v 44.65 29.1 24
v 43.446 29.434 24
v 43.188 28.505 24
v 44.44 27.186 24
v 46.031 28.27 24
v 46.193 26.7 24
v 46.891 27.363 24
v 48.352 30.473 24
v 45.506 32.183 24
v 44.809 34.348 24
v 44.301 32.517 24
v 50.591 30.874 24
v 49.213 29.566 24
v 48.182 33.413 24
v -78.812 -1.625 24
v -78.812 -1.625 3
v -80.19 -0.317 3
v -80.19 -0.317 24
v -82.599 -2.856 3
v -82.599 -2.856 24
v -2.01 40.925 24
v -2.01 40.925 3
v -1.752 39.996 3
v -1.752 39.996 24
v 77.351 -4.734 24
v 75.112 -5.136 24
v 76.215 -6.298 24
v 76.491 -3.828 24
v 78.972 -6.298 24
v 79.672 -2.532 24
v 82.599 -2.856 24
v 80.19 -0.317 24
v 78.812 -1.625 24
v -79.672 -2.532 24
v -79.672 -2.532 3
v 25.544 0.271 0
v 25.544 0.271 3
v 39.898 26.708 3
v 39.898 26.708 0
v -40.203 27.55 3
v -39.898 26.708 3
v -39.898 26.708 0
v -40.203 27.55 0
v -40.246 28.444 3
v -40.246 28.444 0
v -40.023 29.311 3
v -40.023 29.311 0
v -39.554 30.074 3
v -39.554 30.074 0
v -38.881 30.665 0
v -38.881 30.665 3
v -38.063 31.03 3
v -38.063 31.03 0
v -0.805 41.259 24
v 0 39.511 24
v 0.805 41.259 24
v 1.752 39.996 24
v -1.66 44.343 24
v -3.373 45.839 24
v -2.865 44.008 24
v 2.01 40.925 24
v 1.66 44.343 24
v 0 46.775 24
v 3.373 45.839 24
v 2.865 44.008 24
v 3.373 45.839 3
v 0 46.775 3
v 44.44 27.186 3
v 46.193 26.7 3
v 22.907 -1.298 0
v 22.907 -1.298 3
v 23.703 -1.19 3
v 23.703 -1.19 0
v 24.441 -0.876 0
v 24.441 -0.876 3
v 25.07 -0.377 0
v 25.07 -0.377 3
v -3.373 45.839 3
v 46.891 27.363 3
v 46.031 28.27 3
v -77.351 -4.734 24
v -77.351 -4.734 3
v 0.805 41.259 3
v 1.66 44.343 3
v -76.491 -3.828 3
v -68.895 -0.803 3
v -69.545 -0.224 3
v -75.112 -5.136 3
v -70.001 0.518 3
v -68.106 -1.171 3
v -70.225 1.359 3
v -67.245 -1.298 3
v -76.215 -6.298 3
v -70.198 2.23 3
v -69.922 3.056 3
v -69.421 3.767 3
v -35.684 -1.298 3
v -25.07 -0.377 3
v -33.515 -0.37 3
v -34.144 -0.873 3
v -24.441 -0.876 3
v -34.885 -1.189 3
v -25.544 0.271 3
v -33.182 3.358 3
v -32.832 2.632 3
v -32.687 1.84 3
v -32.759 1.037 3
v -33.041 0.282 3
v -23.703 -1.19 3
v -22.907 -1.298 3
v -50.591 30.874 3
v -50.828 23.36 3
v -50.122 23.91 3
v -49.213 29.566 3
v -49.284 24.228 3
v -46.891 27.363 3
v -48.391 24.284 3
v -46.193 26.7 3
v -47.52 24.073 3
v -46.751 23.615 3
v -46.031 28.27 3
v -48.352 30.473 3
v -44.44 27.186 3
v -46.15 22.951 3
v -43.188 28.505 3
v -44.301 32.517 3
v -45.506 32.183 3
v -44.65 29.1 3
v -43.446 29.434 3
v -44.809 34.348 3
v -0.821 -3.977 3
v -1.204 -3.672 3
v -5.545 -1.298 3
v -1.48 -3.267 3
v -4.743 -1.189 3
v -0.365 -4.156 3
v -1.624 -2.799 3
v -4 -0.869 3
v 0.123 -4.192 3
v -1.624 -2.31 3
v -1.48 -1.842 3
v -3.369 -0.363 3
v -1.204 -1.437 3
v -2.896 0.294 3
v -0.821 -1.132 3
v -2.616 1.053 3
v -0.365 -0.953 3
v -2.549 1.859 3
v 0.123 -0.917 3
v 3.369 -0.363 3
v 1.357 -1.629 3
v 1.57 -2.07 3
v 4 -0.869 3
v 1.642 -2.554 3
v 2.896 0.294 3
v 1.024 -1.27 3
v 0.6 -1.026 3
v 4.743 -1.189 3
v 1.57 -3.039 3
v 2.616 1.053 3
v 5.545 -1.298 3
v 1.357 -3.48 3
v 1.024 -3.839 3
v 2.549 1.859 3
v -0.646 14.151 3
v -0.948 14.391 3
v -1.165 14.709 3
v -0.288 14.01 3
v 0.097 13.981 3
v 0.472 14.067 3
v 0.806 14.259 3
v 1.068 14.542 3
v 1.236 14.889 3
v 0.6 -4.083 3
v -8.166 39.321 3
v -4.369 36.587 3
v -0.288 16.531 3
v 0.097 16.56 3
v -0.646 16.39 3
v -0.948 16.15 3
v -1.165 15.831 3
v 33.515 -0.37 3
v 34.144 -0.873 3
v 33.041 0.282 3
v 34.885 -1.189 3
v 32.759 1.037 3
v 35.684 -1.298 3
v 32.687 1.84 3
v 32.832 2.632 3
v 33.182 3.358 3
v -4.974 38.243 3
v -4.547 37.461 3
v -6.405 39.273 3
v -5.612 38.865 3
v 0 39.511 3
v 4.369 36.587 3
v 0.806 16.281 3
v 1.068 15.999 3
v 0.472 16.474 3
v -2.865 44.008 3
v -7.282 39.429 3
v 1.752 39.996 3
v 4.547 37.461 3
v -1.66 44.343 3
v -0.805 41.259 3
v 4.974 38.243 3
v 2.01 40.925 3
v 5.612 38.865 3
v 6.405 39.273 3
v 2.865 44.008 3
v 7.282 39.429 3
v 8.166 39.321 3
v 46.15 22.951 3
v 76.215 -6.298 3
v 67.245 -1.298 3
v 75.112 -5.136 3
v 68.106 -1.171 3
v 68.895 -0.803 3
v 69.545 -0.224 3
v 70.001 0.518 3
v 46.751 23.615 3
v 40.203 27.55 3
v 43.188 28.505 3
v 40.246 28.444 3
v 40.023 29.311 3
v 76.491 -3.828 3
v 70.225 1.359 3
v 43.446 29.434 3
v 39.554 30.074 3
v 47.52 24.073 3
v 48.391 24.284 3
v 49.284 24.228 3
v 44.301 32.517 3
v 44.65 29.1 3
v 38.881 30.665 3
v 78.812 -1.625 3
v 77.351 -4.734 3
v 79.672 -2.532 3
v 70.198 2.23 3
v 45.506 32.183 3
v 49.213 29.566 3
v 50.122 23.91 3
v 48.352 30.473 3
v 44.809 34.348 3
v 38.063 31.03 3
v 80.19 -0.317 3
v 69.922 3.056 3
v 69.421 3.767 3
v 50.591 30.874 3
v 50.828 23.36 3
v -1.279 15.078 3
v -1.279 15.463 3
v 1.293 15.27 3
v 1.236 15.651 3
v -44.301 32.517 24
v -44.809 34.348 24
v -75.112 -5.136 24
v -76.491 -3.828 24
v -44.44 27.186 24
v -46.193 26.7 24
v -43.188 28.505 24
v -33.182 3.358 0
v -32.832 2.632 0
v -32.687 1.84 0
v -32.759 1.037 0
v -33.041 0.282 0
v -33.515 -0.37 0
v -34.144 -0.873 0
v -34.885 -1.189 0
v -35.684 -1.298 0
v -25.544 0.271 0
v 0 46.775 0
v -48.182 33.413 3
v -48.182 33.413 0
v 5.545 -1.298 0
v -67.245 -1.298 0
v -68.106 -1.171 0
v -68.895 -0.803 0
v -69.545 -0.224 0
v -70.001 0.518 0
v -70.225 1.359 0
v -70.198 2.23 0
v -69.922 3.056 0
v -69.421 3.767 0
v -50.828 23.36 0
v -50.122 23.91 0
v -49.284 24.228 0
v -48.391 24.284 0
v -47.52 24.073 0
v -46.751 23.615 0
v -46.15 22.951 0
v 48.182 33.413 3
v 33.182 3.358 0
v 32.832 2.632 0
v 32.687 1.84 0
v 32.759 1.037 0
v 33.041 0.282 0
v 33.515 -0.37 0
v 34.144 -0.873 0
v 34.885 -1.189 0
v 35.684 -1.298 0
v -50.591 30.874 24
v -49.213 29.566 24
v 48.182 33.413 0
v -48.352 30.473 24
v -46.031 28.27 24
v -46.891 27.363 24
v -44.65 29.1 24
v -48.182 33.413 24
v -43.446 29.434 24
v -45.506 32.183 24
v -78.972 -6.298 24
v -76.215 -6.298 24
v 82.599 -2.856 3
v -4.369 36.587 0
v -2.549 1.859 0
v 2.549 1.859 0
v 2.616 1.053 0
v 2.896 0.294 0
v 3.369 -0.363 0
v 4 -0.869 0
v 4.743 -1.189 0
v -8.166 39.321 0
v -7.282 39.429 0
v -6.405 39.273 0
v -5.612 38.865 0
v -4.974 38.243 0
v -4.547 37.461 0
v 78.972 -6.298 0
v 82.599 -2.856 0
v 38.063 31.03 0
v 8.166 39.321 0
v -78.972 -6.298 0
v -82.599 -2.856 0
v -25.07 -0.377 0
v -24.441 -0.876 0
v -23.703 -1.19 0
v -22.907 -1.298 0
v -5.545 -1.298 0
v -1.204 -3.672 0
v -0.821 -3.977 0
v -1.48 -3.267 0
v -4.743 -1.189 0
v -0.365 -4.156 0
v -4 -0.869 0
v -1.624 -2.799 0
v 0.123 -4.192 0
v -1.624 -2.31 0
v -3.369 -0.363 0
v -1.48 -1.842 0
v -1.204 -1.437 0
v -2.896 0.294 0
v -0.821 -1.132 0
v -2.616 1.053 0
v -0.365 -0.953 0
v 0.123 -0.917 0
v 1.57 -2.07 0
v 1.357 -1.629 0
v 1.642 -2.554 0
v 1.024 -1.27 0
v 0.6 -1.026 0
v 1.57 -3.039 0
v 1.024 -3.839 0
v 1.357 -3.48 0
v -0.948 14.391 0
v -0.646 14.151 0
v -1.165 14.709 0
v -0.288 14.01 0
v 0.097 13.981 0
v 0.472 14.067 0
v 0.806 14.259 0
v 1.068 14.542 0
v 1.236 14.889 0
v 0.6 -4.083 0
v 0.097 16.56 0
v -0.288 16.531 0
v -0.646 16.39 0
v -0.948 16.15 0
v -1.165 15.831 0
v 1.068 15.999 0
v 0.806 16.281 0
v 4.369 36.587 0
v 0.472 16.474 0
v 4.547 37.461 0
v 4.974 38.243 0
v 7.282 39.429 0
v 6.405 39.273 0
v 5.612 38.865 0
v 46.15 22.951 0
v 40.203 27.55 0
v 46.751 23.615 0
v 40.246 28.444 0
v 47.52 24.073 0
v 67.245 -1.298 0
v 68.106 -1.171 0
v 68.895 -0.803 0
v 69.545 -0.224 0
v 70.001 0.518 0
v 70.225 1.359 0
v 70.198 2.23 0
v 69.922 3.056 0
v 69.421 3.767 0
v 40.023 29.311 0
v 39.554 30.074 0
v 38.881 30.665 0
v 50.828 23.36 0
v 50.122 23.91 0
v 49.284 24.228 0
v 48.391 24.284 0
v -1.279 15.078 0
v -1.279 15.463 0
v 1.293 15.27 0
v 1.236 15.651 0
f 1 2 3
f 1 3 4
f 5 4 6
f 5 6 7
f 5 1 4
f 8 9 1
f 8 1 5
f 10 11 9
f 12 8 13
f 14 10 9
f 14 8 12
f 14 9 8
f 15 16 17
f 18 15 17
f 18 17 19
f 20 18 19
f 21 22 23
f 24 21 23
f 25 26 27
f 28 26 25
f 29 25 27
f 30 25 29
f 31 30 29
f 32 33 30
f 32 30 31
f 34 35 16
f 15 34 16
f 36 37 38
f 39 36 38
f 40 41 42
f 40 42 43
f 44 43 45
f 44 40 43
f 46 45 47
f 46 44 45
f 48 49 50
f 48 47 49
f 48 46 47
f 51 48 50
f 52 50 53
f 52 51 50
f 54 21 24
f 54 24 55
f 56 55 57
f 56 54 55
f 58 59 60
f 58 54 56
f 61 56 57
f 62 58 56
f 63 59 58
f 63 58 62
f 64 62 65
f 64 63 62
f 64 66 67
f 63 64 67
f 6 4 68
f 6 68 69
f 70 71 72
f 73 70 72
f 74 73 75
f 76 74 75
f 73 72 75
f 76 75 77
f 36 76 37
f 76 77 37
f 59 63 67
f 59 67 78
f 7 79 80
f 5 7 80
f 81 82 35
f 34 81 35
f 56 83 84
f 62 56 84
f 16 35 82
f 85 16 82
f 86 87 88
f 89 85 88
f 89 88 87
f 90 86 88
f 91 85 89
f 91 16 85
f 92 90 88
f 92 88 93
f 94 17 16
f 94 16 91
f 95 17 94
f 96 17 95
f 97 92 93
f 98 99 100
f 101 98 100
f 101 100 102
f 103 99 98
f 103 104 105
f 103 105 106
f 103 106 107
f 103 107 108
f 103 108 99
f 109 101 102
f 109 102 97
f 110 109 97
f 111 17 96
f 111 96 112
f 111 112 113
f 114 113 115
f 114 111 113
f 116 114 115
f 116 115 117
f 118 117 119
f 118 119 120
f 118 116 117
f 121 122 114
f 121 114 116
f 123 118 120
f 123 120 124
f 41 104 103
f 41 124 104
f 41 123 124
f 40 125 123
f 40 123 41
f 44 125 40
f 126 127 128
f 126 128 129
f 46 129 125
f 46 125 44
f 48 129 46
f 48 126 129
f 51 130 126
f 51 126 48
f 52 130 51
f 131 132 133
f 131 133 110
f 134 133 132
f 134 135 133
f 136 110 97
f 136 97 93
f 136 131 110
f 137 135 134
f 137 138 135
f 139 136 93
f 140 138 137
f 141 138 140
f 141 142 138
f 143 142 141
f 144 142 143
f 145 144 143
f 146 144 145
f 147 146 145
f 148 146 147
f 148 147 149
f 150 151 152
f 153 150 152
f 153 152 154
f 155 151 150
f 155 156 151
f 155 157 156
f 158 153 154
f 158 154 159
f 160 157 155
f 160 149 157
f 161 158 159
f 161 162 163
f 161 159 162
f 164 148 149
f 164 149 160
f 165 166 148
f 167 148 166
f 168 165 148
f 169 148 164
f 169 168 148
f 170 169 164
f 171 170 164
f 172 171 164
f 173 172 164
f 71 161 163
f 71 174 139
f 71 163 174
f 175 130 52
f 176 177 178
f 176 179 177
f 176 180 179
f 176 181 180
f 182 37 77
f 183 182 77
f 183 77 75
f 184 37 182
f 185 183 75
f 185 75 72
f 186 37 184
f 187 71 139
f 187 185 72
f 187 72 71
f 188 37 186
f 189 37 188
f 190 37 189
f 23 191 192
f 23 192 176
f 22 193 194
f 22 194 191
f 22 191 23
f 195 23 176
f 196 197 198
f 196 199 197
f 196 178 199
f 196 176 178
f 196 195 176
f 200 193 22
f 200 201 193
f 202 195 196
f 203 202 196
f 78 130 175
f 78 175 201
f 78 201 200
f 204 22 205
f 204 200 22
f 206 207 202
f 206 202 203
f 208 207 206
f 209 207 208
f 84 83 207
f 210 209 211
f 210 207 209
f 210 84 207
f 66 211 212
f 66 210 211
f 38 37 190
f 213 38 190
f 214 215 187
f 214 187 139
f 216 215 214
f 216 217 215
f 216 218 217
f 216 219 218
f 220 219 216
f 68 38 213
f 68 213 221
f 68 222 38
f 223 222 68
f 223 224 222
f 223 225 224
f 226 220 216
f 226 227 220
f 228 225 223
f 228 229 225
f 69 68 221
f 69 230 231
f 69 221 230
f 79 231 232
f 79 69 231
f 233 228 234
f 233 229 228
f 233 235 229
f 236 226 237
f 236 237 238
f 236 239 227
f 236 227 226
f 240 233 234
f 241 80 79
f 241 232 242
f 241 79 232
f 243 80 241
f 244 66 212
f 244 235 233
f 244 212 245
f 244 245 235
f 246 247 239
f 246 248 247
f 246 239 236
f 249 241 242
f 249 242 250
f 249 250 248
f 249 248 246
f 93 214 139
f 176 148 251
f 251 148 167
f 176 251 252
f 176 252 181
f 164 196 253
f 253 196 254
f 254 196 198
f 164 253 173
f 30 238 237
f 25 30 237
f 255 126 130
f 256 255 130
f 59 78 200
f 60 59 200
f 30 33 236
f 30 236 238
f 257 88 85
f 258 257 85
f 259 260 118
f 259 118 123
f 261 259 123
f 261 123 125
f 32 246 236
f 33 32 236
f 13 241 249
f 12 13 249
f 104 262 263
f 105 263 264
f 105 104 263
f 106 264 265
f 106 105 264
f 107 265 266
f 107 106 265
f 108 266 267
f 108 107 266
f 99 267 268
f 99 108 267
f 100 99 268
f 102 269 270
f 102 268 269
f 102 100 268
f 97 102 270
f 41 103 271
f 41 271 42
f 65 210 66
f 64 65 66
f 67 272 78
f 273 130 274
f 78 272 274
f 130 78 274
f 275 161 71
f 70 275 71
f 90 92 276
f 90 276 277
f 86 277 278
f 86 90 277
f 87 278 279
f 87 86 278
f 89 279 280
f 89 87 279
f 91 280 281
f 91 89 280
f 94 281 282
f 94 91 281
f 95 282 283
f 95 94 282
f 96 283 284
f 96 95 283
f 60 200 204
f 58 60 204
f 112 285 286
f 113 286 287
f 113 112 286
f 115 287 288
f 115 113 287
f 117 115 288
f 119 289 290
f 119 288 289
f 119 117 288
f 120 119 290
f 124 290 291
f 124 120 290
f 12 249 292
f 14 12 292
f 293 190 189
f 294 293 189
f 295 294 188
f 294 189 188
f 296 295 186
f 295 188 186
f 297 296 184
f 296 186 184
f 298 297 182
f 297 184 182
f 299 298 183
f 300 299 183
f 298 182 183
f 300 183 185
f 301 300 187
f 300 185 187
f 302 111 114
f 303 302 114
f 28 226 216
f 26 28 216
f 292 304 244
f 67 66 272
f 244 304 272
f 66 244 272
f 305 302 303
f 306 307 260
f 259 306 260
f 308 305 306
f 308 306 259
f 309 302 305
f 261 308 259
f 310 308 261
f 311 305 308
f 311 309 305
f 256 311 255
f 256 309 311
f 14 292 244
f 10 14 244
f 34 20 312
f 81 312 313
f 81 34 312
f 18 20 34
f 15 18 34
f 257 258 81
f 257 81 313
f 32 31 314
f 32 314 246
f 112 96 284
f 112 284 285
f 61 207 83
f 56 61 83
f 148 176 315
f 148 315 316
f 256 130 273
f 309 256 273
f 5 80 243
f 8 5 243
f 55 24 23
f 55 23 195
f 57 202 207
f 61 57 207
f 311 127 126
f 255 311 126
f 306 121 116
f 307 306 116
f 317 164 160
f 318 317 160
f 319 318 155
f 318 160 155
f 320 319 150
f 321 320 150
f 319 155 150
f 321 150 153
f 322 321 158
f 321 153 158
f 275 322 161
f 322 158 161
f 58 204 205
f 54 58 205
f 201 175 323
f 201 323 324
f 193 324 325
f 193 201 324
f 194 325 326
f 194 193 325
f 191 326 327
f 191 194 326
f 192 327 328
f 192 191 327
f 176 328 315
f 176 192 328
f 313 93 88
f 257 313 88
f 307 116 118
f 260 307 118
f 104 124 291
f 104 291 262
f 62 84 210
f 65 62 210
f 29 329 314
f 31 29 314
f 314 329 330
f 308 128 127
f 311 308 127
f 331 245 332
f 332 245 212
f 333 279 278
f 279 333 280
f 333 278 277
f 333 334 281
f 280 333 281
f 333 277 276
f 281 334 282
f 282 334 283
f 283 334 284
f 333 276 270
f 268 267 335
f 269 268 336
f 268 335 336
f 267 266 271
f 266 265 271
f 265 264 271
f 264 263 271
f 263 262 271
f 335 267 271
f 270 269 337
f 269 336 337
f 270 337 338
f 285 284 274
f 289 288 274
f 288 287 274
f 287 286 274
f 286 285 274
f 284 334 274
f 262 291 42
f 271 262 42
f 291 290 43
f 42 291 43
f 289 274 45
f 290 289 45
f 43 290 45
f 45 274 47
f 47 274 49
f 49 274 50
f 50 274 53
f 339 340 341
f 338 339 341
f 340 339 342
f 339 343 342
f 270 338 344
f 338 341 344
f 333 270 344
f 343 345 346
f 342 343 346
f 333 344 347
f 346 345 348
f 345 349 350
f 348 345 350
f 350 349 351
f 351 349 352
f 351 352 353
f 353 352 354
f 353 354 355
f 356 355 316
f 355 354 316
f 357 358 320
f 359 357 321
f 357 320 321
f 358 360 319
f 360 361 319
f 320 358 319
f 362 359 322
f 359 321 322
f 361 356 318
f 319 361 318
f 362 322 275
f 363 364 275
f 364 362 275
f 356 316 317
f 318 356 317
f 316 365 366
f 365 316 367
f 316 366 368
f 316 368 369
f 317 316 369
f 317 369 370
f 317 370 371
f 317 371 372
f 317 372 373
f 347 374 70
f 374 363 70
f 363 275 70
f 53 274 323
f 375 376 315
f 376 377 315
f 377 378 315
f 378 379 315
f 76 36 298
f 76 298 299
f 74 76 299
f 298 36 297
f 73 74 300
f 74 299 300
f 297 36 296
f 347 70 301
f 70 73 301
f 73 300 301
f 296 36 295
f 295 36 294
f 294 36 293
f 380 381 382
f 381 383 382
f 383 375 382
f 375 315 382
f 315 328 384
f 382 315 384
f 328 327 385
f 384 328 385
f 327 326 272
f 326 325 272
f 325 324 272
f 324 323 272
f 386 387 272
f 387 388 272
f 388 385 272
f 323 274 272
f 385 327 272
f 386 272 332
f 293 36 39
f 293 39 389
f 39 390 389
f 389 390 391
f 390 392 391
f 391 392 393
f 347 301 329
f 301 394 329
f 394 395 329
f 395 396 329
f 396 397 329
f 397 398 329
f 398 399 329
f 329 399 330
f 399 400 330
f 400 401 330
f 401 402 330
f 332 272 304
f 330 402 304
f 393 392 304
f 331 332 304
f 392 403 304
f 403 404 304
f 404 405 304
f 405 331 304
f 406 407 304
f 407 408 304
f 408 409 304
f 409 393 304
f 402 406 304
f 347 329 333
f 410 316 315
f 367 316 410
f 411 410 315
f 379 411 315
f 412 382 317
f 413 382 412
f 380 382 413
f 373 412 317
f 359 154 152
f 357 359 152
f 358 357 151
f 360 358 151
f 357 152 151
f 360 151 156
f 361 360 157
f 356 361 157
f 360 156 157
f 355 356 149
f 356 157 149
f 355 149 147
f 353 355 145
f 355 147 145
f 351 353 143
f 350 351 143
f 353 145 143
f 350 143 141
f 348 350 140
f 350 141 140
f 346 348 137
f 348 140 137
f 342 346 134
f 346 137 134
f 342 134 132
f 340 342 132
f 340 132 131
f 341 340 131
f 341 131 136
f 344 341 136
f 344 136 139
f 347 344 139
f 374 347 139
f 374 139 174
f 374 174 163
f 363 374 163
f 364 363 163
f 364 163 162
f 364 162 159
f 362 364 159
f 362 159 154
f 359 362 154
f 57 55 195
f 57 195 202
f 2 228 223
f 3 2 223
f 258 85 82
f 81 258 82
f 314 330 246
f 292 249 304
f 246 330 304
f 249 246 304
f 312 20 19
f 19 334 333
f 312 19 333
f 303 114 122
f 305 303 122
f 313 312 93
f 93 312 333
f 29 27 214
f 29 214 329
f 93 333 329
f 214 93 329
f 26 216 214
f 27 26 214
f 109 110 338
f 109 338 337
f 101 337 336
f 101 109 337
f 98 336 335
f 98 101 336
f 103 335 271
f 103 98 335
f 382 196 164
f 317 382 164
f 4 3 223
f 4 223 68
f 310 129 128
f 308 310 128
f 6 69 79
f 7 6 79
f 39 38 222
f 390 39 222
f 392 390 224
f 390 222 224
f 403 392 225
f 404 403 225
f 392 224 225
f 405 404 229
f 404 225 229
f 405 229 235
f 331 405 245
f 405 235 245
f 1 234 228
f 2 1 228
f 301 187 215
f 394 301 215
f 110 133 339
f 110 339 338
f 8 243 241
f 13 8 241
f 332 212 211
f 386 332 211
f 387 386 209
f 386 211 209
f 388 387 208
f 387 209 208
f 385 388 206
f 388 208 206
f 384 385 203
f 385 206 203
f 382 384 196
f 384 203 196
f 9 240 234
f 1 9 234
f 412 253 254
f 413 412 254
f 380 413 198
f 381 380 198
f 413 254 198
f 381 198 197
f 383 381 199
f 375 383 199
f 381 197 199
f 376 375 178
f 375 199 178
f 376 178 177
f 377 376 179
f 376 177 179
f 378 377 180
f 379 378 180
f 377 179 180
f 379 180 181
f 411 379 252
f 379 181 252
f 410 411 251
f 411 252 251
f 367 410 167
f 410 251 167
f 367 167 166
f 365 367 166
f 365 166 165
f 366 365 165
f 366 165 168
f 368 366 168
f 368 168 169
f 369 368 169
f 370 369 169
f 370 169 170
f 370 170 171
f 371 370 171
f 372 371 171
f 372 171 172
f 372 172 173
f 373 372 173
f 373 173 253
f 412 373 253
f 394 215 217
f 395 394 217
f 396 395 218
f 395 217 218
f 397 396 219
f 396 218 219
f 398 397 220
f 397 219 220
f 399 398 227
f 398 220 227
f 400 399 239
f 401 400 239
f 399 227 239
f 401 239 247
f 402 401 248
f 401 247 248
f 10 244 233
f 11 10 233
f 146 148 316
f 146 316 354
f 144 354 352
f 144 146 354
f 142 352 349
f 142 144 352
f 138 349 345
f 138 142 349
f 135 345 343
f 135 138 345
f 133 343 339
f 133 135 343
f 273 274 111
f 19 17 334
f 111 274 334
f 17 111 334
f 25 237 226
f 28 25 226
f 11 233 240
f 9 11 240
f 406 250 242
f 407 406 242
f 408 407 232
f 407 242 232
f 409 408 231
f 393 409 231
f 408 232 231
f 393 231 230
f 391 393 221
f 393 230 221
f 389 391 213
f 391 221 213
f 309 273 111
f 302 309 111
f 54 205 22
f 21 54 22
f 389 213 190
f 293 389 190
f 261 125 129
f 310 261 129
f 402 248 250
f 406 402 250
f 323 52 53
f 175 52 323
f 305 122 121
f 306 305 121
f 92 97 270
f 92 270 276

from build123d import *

# Parameters (mm, degrees)
BOSS_EXTRUDE1_DEPTH = 3
BOSS_EXTRUDE2_DEPTH = 21
SKETCH3_R           = 1.642484664
SKETCH3_R_2         = 1.292978033
CUT_EXTRUDE1_DEPTH  = 98.218880344


with BuildPart() as part:
    # Sketch1 → Boss-Extrude1 (new body)
    with BuildSketch(Plane.XY):
        Polygon((-82.599251445, -2.855918156), (-78.97237959, -6.297691035), (78.97237959, -6.297691035), (82.599251445, -2.855918156), (48.18152266, 33.412800394), (0, 46.774719198), (-48.18152266, 33.412800394), align=None)
    extrude(amount=BOSS_EXTRUDE1_DEPTH)

    # Sketch2 → Boss-Extrude2 (add)
    with BuildSketch(Plane.XY.offset(3)):
        Polygon((-44.808816074, 34.34813471), (-48.18152266, 33.412800394), (-50.590763675, 30.873990096), (-49.21255237, 29.566116402), (-48.352109151, 30.472834366), (-46.030911164, 28.270099723), (-46.891354383, 27.36338176), (-46.192513036, 26.700206083), (-44.440185395, 27.186169547), (-43.188437129, 28.505236993), (-43.445900356, 29.433619399), (-44.650438423, 29.099571429), (-45.505601226, 32.183188879), (-44.30106316, 32.517236849), align=None)
        Polygon((0, 46.774719198), (-3.372706586, 45.839384882), (-2.864953672, 44.008487021), (-1.660415605, 44.342534991), (-0.805252802, 41.25891754), (-2.009790868, 40.92486957), (-1.752327641, 39.996487164), (0, 39.5105237), (1.752327641, 39.996487164), (2.009790868, 40.92486957), (0.805252802, 41.25891754), (1.660415605, 44.342534991), (2.864953672, 44.008487021), (3.372706586, 45.839384882), align=None)
        Polygon((-78.811799125, -1.624981552), (-80.19001043, -0.317107858), (-82.599251445, -2.855918156), (-78.97237959, -6.297691035), (-76.215182645, -6.297691035), (-75.112389833, -5.135589888), (-76.490601138, -3.827716194), (-77.351044358, -4.734434158), (-79.672242345, -2.531699516), align=None)
        Polygon((48.18152266, 33.412800394), (44.808816074, 34.34813471), (44.30106316, 32.517236849), (45.505601226, 32.183188879), (44.650438423, 29.099571429), (43.445900356, 29.433619399), (43.188437129, 28.505236993), (44.440185395, 27.186169547), (46.192513036, 26.700206083), (46.891354383, 27.36338176), (46.030911164, 28.270099723), (48.352109151, 30.472834366), (49.21255237, 29.566116402), (50.590763675, 30.873990096), align=None)
        Polygon((75.112389833, -5.135589888), (76.215182645, -6.297691035), (78.97237959, -6.297691035), (82.599251445, -2.855918156), (80.19001043, -0.317107858), (78.811799125, -1.624981552), (79.672242345, -2.531699516), (77.351044358, -4.734434158), (76.490601138, -3.827716194), align=None)
    extrude(amount=BOSS_EXTRUDE2_DEPTH)

    # Sketch3 → Cut-Extrude1 (cut, through all)
    with BuildSketch(Plane.XY.offset(3)):
        with Locations((0, -2.554468846)):
            Circle(SKETCH3_R)
        with Locations((0, 15.270369354)):
            Circle(SKETCH3_R_2)
        with BuildLine():
            Line((-69.420990751, 3.767372692), (-50.828151114, 23.360137575))
            ThreePointArc((-50.828151114, 23.360137575), (-48.390560772, 24.283657942), (-46.150370534, 22.950884804))
            Line((-46.150370534, 22.950884804), (-33.182202355, 3.358119921))
            ThreePointArc((-33.182202355, 3.358119921), (-33.041187606, 0.282349963), (-35.683859821, -1.297691035))
            Line((-35.683859821, -1.297691035), (-67.244867638, -1.297691035))
            ThreePointArc((-67.244867638, -1.297691035), (-70.001241269, 0.518077396), (-69.420990751, 3.767372692))
        make_face()
        with BuildLine():
            Line((-25.543650537, 0.270832684), (-39.897767636, 26.707827652))
            ThreePointArc((-39.897767636, 26.707827652), (-40.022830858, 29.311497318), (-38.063031426, 31.030195292))
            Line((-38.063031426, 31.030195292), (-8.166425929, 39.321257781))
            ThreePointArc((-8.166425929, 39.321257781), (-5.611961803, 38.865088367), (-4.368822196, 36.58737429))
            Line((-4.368822196, 36.58737429), (-2.548801826, 1.859316834))
            ThreePointArc((-2.548801826, 1.859316834), (-3.368567317, -0.362754762), (-5.54469043, -1.297691035))
            Line((-5.54469043, -1.297691035), (-22.907199199, -1.297691035))
            ThreePointArc((-22.907199199, -1.297691035), (-24.441078457, -0.875910269), (-25.543650537, 0.270832684))
        make_face()
        with BuildLine():
            Line((5.54469043, -1.297691035), (22.907199199, -1.297691035))
            ThreePointArc((22.907199199, -1.297691035), (24.441078457, -0.875910269), (25.543650537, 0.270832684))
            Line((25.543650537, 0.270832684), (39.897767636, 26.707827652))
            ThreePointArc((39.897767636, 26.707827652), (40.022830858, 29.311497318), (38.063031426, 31.030195292))
            Line((38.063031426, 31.030195292), (8.166425929, 39.321257781))
            ThreePointArc((8.166425929, 39.321257781), (5.611961803, 38.865088367), (4.368822196, 36.58737429))
            Line((4.368822196, 36.58737429), (2.548801826, 1.859316834))
            ThreePointArc((2.548801826, 1.859316834), (3.368567317, -0.362754762), (5.54469043, -1.297691035))
        make_face()
        with BuildLine():
            Line((35.683859821, -1.297691035), (67.244867638, -1.297691035))
            ThreePointArc((67.244867638, -1.297691035), (70.001241269, 0.518077396), (69.420990751, 3.767372692))
            Line((69.420990751, 3.767372692), (50.828151114, 23.360137575))
            ThreePointArc((50.828151114, 23.360137575), (48.390560772, 24.283657942), (46.150370534, 22.950884804))
            Line((46.150370534, 22.950884804), (33.182202355, 3.358119921))
            ThreePointArc((33.182202355, 3.358119921), (33.041187606, 0.282349963), (35.683859821, -1.297691035))
        make_face()
    extrude(amount=-CUT_EXTRUDE1_DEPTH, mode=Mode.SUBTRACT)


solid = part.part
